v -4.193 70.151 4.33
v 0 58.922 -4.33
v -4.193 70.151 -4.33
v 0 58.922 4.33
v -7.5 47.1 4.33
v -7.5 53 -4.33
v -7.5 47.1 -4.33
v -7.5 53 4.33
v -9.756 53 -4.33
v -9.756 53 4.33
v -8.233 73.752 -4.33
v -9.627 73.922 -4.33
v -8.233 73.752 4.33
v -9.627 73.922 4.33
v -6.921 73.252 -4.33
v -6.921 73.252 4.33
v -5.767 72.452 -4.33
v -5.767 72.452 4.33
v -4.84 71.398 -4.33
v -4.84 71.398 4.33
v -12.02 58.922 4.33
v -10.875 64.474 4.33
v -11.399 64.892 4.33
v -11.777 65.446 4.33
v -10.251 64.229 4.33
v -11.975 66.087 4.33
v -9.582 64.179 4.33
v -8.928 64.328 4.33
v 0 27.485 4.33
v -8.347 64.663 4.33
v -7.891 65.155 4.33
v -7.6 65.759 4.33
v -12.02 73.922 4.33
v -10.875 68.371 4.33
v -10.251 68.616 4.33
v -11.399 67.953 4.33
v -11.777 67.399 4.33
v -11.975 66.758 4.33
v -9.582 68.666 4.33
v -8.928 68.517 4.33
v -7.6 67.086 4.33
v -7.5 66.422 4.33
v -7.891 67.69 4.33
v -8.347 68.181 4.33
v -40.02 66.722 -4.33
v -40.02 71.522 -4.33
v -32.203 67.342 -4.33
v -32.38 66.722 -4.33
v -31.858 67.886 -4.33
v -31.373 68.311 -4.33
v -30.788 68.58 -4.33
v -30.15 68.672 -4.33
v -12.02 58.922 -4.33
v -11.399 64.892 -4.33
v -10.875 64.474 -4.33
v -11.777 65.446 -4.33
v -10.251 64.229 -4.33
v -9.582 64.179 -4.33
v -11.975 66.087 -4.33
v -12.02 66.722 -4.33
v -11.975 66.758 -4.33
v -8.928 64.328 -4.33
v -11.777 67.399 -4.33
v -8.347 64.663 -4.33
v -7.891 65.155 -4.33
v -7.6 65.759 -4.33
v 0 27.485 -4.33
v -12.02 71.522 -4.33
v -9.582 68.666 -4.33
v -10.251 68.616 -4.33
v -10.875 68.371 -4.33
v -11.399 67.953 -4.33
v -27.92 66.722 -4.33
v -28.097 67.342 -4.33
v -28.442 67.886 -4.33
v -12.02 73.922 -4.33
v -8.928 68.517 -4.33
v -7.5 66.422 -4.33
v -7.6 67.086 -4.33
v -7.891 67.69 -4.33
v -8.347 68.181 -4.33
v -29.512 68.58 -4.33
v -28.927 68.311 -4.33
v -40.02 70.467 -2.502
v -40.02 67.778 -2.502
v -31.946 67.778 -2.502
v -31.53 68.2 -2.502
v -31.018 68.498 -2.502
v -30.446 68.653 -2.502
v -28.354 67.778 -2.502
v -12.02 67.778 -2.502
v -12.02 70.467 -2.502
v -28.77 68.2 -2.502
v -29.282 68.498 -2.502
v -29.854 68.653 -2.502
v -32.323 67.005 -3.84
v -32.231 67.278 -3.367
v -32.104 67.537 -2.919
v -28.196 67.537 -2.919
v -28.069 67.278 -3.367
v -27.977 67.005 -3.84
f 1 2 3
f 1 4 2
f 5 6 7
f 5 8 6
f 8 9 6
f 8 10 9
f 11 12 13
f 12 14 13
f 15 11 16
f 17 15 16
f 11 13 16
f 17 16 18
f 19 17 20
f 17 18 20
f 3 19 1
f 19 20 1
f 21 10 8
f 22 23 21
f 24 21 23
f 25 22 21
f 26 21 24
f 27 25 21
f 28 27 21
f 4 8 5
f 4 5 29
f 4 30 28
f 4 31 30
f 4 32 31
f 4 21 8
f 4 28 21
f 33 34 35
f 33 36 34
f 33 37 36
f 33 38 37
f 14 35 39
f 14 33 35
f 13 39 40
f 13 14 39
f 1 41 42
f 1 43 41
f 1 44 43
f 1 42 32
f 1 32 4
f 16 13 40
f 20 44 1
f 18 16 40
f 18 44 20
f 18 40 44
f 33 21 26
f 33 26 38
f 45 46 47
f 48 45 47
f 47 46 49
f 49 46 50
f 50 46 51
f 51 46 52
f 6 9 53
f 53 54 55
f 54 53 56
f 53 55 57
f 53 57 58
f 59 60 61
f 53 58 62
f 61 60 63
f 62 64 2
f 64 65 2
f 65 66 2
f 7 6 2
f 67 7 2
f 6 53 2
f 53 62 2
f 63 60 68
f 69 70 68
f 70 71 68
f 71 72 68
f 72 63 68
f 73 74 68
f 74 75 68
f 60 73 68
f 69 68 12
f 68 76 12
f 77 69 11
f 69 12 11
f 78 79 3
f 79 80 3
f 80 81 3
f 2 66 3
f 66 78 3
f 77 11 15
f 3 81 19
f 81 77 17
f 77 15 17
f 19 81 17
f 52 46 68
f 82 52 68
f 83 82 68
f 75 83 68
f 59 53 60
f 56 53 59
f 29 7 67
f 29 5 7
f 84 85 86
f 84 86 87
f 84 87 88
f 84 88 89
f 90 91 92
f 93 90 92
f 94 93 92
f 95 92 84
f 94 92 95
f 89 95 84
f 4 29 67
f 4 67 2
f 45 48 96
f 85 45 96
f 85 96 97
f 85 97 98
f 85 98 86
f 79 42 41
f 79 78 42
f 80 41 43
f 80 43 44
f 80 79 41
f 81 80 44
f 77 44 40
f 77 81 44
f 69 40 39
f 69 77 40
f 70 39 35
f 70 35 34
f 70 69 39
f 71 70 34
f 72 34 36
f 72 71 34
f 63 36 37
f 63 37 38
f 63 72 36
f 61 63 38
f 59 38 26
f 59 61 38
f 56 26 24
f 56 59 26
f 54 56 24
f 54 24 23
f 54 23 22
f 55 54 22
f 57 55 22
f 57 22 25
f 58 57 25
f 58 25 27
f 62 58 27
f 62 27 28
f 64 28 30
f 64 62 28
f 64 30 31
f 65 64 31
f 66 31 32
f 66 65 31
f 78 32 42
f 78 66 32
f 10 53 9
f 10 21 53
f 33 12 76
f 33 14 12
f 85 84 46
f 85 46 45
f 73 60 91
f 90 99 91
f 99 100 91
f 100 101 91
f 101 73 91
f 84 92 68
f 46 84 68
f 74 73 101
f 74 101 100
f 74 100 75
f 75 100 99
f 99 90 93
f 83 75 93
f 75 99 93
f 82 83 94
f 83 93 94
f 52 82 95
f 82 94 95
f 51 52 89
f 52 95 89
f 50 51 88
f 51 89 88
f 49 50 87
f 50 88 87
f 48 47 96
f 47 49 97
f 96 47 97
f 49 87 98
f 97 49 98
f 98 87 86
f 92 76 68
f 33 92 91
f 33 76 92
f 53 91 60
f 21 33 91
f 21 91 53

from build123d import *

# Parameters (mm, degrees)
F0_R     = 2.25
F1_DEPTH = 4.330125
F2_R     = 5.8
F4_DEPTH = 28
F5_R     = 2.25
F6_DEPTH = 25


with BuildPart() as f1:
    # F0 (on Top) → F1 (new body, symmetric)
    with BuildSketch(Plane.XY):
        Polygon((-7.5, 47.100404), (0, 27.485359), (0, 58.922307), (-5.601237, 73.922307), (-12.020218, 73.922307), (-12.020218, 58.922307), (-9.755767, 53), (-7.5, 53), align=None)
        with Locations((-9.75, 66.422307)):
            Circle(F0_R, mode=Mode.SUBTRACT)
    extrude(amount=F1_DEPTH, both=True)

    # F2
    f2_edges = [f1.edges().sort_by_distance(p)[0] for p in [
        (-5.601237, 73.922307, 0),
    ]]
    fillet(f2_edges, radius=F2_R)

    # F3 (on face) → F4 (join)
    with BuildSketch(Plane(origin=(-12.020218, 0, 0), x_dir=(0, -1, 0), z_dir=(-1, 0, 0))):
        Polygon((-70.466645, -2.501664), (-71.522307, -4.330125), (-66.722307, -4.330125), (-67.777969, -2.501664), align=None)
    extrude(amount=F4_DEPTH)

    # F5 (on face) → F6 (cut)
    with BuildSketch(Plane.XY.offset(4.330125)):
        with Locations((-30.15, 66.422307)):
            Circle(F5_R)
    extrude(amount=-F6_DEPTH, mode=Mode.SUBTRACT)


solid = f1.part
